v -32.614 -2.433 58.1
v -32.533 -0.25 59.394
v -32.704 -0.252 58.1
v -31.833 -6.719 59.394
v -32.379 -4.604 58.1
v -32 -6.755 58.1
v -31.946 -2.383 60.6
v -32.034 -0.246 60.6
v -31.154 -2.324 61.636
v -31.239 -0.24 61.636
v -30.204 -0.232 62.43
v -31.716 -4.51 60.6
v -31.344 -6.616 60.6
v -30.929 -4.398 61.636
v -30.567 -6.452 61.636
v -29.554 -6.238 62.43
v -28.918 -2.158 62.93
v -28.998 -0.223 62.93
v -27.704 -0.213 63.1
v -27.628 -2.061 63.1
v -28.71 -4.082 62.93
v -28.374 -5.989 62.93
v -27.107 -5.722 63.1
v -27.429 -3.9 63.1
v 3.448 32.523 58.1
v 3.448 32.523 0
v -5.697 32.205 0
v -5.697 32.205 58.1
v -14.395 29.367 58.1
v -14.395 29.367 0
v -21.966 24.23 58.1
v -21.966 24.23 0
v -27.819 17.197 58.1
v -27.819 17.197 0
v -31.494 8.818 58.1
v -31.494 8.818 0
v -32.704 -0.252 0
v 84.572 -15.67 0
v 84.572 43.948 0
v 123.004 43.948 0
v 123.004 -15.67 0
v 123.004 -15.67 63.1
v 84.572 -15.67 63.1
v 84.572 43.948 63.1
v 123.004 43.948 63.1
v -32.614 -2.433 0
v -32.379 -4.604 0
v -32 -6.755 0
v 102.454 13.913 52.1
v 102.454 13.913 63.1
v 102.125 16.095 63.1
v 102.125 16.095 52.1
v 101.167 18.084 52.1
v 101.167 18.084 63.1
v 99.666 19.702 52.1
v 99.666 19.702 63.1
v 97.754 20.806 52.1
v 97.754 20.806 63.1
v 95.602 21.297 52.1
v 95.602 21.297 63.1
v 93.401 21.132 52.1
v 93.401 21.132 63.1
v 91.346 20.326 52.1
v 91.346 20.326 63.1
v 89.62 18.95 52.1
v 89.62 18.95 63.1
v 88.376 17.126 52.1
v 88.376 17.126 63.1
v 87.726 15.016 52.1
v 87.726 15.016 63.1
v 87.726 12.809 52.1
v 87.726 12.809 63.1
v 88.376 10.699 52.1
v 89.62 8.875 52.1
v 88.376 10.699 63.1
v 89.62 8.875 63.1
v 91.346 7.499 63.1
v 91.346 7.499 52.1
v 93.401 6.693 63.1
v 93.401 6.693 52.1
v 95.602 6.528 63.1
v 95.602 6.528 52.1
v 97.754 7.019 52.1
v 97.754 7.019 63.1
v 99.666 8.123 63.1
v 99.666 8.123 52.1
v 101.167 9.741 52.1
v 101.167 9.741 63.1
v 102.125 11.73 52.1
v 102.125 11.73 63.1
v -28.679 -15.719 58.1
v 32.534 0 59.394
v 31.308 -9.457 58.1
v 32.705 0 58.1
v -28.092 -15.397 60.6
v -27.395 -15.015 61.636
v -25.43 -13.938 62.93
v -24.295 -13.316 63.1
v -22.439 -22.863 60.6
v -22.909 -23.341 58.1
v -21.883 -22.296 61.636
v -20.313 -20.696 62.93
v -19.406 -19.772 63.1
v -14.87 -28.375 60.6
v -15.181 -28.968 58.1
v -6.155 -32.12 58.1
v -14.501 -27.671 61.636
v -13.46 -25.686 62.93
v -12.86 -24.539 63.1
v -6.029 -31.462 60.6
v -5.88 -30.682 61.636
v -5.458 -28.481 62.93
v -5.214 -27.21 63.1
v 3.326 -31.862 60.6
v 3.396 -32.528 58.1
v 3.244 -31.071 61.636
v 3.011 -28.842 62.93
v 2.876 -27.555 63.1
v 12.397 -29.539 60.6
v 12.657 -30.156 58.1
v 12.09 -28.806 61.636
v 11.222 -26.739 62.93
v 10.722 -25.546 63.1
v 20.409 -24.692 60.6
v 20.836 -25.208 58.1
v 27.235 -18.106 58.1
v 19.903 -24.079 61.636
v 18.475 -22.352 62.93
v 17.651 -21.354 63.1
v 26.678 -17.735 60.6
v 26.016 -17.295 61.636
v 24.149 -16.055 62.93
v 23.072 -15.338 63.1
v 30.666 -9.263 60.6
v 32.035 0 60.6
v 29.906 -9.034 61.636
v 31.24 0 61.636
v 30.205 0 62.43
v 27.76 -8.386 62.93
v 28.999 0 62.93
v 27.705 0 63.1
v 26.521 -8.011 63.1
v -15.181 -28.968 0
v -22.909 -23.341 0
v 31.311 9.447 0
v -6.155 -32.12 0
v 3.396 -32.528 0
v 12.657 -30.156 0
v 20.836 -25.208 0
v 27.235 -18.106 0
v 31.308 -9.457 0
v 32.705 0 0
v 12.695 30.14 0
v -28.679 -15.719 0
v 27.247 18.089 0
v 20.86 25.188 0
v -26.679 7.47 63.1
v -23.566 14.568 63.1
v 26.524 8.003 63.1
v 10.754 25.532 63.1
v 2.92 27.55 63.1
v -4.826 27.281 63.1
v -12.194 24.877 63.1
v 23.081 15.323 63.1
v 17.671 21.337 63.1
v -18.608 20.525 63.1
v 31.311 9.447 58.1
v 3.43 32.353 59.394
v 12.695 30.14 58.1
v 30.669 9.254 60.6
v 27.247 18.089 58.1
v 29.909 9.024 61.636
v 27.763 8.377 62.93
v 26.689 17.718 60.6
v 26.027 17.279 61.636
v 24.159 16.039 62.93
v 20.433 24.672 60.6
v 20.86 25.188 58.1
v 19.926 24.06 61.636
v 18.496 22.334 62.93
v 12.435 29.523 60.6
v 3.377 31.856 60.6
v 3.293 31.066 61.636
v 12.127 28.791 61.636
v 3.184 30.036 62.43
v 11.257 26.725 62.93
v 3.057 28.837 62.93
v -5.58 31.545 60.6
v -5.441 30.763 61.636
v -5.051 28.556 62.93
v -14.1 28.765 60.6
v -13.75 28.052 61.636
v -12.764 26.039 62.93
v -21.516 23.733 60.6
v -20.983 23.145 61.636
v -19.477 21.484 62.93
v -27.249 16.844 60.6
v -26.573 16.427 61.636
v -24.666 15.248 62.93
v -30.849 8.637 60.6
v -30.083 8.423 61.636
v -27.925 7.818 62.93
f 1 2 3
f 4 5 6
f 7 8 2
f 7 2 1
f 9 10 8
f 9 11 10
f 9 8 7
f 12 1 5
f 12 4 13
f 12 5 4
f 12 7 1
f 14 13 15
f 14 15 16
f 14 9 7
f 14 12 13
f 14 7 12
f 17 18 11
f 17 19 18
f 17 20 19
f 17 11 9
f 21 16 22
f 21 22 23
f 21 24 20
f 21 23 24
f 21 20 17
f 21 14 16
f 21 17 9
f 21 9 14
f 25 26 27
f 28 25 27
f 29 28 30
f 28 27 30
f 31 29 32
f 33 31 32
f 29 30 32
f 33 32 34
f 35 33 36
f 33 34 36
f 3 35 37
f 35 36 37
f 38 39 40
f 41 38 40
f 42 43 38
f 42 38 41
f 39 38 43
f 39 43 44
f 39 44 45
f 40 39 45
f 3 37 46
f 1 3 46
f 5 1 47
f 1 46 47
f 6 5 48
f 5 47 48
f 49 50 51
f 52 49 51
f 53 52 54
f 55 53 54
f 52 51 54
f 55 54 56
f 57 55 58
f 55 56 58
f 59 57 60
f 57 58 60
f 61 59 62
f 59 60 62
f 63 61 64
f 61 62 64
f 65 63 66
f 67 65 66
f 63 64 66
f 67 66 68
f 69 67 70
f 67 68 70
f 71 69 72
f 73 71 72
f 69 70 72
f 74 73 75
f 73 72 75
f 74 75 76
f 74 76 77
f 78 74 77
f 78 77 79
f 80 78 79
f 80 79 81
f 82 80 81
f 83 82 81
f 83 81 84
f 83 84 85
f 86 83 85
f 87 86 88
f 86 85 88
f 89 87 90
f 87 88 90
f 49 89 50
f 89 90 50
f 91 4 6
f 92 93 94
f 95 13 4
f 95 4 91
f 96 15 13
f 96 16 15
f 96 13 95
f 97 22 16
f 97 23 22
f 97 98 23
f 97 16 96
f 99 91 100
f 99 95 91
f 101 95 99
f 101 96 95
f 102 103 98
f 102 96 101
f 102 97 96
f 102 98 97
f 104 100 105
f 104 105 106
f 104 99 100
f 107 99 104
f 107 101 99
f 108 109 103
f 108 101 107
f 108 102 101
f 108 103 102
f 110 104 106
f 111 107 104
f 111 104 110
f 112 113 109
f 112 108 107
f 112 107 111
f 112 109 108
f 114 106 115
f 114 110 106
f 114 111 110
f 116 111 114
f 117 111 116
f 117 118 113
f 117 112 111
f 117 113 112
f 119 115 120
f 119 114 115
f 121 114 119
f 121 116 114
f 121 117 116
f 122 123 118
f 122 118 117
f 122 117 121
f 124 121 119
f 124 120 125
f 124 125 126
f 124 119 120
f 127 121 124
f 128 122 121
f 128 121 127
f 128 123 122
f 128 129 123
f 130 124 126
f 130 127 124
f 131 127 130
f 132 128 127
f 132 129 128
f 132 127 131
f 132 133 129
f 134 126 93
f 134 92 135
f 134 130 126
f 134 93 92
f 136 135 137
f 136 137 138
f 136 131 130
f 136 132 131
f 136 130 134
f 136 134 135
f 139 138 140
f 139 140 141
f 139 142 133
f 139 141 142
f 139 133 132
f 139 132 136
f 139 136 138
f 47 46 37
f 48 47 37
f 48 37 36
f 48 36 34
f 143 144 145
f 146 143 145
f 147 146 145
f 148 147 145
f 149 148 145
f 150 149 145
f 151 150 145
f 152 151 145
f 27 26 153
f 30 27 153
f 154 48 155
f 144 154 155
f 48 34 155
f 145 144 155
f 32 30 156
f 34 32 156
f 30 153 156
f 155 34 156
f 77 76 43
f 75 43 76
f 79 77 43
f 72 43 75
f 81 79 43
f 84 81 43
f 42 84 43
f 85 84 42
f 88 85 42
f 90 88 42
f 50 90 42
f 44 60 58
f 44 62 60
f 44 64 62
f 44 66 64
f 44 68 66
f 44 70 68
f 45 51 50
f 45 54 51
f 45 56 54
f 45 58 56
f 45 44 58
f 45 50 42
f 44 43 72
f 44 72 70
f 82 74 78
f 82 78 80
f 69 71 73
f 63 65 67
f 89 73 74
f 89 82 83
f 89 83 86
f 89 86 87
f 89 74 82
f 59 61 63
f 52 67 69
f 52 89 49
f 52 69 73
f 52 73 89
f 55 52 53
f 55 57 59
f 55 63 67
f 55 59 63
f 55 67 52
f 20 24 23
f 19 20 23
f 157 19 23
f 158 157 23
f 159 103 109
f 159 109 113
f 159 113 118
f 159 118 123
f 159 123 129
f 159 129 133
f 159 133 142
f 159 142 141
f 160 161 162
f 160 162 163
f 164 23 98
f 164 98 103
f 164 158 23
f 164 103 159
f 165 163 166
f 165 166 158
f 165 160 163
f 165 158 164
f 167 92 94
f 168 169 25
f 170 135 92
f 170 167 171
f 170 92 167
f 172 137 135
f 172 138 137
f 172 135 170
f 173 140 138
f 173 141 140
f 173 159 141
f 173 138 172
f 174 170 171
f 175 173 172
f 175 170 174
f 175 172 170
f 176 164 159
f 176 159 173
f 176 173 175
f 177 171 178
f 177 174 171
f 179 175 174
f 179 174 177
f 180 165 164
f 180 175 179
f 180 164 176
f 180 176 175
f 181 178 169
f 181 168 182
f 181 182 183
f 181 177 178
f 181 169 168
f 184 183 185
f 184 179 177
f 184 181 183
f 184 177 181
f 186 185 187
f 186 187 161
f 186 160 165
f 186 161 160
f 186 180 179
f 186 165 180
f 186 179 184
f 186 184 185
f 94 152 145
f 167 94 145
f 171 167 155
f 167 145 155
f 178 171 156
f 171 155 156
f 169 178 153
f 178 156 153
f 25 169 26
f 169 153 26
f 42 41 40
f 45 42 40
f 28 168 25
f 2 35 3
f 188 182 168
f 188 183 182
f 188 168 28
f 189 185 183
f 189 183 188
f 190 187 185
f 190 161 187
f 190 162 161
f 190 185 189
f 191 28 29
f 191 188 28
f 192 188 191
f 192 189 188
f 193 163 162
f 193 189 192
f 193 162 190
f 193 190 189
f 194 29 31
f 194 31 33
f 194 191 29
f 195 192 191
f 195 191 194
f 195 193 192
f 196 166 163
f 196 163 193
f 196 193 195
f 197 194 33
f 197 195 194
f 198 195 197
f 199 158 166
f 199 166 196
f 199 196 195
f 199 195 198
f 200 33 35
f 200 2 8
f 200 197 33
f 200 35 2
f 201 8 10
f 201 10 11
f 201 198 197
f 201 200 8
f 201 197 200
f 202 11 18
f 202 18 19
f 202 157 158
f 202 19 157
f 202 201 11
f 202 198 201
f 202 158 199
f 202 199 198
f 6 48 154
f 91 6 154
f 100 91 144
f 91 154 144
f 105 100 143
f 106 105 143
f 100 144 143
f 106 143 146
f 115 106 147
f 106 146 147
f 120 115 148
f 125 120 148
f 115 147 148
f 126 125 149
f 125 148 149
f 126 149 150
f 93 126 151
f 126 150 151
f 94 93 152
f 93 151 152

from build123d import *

# Parameters (mm, degrees)
F1_DEPTH = 63.1
F0_W     = 38.4319275618
F0_H     = 59.6171896905
F2_R     = 5
F3_R     = 7.4055413417
F4_DEPTH = 11


with BuildPart() as f1:
    # F0 (on Top) → F1 (new body)
    with BuildSketch(Plane.XY):
        with BuildLine():
            ThreePointArc((-32.7037602776, -0.2515915217), (-32.514672303, -3.5206987403), (-31.9996221867, -6.7545106778))
            Line((-31.9996221867, -6.7545106778), (-32.7037602776, -0.2515915217))
        make_face()
        with BuildLine():
            Line((-32.7037602776, -0.2515915217), (-31.9996221867, -6.7545106778))
            ThreePointArc((-31.9996221867, -6.7545106778), (3.3956070417, -32.5279739211), (32.7047280159, 0))
            ThreePointArc((32.7047280159, 0), (24.3140893809, 21.8729122928), (3.447533647, 32.5225113782))
            ThreePointArc((3.447533647, 32.5225113782), (-21.966273111, 24.2297767262), (-32.7037602776, -0.2515915217))
        make_face()
    extrude(amount=F1_DEPTH)

    # F2
    f2_edges = [f1.edges().sort_by_distance(p)[0] for p in [
        (31.999622, 6.754511, 63.1),
    ]]
    fillet(f2_edges, radius=F2_R)


with BuildPart() as f1b:
    # F0 (on Top) → F1, piece 2 (new body)
    with BuildSketch(Plane.XY):
        with Locations((103.7881597877, 14.1390385106)):
            Rectangle(F0_W, F0_H)
    extrude(amount=F1_DEPTH)

    # F3 (on face) → F4 (cut)
    with BuildSketch(Plane.XY.offset(63.1)):
        with Locations((95.0485095382, 13.9125082642)):
            Circle(F3_R)
    extrude(amount=-F4_DEPTH, mode=Mode.SUBTRACT)


solid = Compound([f1.part, f1b.part])
